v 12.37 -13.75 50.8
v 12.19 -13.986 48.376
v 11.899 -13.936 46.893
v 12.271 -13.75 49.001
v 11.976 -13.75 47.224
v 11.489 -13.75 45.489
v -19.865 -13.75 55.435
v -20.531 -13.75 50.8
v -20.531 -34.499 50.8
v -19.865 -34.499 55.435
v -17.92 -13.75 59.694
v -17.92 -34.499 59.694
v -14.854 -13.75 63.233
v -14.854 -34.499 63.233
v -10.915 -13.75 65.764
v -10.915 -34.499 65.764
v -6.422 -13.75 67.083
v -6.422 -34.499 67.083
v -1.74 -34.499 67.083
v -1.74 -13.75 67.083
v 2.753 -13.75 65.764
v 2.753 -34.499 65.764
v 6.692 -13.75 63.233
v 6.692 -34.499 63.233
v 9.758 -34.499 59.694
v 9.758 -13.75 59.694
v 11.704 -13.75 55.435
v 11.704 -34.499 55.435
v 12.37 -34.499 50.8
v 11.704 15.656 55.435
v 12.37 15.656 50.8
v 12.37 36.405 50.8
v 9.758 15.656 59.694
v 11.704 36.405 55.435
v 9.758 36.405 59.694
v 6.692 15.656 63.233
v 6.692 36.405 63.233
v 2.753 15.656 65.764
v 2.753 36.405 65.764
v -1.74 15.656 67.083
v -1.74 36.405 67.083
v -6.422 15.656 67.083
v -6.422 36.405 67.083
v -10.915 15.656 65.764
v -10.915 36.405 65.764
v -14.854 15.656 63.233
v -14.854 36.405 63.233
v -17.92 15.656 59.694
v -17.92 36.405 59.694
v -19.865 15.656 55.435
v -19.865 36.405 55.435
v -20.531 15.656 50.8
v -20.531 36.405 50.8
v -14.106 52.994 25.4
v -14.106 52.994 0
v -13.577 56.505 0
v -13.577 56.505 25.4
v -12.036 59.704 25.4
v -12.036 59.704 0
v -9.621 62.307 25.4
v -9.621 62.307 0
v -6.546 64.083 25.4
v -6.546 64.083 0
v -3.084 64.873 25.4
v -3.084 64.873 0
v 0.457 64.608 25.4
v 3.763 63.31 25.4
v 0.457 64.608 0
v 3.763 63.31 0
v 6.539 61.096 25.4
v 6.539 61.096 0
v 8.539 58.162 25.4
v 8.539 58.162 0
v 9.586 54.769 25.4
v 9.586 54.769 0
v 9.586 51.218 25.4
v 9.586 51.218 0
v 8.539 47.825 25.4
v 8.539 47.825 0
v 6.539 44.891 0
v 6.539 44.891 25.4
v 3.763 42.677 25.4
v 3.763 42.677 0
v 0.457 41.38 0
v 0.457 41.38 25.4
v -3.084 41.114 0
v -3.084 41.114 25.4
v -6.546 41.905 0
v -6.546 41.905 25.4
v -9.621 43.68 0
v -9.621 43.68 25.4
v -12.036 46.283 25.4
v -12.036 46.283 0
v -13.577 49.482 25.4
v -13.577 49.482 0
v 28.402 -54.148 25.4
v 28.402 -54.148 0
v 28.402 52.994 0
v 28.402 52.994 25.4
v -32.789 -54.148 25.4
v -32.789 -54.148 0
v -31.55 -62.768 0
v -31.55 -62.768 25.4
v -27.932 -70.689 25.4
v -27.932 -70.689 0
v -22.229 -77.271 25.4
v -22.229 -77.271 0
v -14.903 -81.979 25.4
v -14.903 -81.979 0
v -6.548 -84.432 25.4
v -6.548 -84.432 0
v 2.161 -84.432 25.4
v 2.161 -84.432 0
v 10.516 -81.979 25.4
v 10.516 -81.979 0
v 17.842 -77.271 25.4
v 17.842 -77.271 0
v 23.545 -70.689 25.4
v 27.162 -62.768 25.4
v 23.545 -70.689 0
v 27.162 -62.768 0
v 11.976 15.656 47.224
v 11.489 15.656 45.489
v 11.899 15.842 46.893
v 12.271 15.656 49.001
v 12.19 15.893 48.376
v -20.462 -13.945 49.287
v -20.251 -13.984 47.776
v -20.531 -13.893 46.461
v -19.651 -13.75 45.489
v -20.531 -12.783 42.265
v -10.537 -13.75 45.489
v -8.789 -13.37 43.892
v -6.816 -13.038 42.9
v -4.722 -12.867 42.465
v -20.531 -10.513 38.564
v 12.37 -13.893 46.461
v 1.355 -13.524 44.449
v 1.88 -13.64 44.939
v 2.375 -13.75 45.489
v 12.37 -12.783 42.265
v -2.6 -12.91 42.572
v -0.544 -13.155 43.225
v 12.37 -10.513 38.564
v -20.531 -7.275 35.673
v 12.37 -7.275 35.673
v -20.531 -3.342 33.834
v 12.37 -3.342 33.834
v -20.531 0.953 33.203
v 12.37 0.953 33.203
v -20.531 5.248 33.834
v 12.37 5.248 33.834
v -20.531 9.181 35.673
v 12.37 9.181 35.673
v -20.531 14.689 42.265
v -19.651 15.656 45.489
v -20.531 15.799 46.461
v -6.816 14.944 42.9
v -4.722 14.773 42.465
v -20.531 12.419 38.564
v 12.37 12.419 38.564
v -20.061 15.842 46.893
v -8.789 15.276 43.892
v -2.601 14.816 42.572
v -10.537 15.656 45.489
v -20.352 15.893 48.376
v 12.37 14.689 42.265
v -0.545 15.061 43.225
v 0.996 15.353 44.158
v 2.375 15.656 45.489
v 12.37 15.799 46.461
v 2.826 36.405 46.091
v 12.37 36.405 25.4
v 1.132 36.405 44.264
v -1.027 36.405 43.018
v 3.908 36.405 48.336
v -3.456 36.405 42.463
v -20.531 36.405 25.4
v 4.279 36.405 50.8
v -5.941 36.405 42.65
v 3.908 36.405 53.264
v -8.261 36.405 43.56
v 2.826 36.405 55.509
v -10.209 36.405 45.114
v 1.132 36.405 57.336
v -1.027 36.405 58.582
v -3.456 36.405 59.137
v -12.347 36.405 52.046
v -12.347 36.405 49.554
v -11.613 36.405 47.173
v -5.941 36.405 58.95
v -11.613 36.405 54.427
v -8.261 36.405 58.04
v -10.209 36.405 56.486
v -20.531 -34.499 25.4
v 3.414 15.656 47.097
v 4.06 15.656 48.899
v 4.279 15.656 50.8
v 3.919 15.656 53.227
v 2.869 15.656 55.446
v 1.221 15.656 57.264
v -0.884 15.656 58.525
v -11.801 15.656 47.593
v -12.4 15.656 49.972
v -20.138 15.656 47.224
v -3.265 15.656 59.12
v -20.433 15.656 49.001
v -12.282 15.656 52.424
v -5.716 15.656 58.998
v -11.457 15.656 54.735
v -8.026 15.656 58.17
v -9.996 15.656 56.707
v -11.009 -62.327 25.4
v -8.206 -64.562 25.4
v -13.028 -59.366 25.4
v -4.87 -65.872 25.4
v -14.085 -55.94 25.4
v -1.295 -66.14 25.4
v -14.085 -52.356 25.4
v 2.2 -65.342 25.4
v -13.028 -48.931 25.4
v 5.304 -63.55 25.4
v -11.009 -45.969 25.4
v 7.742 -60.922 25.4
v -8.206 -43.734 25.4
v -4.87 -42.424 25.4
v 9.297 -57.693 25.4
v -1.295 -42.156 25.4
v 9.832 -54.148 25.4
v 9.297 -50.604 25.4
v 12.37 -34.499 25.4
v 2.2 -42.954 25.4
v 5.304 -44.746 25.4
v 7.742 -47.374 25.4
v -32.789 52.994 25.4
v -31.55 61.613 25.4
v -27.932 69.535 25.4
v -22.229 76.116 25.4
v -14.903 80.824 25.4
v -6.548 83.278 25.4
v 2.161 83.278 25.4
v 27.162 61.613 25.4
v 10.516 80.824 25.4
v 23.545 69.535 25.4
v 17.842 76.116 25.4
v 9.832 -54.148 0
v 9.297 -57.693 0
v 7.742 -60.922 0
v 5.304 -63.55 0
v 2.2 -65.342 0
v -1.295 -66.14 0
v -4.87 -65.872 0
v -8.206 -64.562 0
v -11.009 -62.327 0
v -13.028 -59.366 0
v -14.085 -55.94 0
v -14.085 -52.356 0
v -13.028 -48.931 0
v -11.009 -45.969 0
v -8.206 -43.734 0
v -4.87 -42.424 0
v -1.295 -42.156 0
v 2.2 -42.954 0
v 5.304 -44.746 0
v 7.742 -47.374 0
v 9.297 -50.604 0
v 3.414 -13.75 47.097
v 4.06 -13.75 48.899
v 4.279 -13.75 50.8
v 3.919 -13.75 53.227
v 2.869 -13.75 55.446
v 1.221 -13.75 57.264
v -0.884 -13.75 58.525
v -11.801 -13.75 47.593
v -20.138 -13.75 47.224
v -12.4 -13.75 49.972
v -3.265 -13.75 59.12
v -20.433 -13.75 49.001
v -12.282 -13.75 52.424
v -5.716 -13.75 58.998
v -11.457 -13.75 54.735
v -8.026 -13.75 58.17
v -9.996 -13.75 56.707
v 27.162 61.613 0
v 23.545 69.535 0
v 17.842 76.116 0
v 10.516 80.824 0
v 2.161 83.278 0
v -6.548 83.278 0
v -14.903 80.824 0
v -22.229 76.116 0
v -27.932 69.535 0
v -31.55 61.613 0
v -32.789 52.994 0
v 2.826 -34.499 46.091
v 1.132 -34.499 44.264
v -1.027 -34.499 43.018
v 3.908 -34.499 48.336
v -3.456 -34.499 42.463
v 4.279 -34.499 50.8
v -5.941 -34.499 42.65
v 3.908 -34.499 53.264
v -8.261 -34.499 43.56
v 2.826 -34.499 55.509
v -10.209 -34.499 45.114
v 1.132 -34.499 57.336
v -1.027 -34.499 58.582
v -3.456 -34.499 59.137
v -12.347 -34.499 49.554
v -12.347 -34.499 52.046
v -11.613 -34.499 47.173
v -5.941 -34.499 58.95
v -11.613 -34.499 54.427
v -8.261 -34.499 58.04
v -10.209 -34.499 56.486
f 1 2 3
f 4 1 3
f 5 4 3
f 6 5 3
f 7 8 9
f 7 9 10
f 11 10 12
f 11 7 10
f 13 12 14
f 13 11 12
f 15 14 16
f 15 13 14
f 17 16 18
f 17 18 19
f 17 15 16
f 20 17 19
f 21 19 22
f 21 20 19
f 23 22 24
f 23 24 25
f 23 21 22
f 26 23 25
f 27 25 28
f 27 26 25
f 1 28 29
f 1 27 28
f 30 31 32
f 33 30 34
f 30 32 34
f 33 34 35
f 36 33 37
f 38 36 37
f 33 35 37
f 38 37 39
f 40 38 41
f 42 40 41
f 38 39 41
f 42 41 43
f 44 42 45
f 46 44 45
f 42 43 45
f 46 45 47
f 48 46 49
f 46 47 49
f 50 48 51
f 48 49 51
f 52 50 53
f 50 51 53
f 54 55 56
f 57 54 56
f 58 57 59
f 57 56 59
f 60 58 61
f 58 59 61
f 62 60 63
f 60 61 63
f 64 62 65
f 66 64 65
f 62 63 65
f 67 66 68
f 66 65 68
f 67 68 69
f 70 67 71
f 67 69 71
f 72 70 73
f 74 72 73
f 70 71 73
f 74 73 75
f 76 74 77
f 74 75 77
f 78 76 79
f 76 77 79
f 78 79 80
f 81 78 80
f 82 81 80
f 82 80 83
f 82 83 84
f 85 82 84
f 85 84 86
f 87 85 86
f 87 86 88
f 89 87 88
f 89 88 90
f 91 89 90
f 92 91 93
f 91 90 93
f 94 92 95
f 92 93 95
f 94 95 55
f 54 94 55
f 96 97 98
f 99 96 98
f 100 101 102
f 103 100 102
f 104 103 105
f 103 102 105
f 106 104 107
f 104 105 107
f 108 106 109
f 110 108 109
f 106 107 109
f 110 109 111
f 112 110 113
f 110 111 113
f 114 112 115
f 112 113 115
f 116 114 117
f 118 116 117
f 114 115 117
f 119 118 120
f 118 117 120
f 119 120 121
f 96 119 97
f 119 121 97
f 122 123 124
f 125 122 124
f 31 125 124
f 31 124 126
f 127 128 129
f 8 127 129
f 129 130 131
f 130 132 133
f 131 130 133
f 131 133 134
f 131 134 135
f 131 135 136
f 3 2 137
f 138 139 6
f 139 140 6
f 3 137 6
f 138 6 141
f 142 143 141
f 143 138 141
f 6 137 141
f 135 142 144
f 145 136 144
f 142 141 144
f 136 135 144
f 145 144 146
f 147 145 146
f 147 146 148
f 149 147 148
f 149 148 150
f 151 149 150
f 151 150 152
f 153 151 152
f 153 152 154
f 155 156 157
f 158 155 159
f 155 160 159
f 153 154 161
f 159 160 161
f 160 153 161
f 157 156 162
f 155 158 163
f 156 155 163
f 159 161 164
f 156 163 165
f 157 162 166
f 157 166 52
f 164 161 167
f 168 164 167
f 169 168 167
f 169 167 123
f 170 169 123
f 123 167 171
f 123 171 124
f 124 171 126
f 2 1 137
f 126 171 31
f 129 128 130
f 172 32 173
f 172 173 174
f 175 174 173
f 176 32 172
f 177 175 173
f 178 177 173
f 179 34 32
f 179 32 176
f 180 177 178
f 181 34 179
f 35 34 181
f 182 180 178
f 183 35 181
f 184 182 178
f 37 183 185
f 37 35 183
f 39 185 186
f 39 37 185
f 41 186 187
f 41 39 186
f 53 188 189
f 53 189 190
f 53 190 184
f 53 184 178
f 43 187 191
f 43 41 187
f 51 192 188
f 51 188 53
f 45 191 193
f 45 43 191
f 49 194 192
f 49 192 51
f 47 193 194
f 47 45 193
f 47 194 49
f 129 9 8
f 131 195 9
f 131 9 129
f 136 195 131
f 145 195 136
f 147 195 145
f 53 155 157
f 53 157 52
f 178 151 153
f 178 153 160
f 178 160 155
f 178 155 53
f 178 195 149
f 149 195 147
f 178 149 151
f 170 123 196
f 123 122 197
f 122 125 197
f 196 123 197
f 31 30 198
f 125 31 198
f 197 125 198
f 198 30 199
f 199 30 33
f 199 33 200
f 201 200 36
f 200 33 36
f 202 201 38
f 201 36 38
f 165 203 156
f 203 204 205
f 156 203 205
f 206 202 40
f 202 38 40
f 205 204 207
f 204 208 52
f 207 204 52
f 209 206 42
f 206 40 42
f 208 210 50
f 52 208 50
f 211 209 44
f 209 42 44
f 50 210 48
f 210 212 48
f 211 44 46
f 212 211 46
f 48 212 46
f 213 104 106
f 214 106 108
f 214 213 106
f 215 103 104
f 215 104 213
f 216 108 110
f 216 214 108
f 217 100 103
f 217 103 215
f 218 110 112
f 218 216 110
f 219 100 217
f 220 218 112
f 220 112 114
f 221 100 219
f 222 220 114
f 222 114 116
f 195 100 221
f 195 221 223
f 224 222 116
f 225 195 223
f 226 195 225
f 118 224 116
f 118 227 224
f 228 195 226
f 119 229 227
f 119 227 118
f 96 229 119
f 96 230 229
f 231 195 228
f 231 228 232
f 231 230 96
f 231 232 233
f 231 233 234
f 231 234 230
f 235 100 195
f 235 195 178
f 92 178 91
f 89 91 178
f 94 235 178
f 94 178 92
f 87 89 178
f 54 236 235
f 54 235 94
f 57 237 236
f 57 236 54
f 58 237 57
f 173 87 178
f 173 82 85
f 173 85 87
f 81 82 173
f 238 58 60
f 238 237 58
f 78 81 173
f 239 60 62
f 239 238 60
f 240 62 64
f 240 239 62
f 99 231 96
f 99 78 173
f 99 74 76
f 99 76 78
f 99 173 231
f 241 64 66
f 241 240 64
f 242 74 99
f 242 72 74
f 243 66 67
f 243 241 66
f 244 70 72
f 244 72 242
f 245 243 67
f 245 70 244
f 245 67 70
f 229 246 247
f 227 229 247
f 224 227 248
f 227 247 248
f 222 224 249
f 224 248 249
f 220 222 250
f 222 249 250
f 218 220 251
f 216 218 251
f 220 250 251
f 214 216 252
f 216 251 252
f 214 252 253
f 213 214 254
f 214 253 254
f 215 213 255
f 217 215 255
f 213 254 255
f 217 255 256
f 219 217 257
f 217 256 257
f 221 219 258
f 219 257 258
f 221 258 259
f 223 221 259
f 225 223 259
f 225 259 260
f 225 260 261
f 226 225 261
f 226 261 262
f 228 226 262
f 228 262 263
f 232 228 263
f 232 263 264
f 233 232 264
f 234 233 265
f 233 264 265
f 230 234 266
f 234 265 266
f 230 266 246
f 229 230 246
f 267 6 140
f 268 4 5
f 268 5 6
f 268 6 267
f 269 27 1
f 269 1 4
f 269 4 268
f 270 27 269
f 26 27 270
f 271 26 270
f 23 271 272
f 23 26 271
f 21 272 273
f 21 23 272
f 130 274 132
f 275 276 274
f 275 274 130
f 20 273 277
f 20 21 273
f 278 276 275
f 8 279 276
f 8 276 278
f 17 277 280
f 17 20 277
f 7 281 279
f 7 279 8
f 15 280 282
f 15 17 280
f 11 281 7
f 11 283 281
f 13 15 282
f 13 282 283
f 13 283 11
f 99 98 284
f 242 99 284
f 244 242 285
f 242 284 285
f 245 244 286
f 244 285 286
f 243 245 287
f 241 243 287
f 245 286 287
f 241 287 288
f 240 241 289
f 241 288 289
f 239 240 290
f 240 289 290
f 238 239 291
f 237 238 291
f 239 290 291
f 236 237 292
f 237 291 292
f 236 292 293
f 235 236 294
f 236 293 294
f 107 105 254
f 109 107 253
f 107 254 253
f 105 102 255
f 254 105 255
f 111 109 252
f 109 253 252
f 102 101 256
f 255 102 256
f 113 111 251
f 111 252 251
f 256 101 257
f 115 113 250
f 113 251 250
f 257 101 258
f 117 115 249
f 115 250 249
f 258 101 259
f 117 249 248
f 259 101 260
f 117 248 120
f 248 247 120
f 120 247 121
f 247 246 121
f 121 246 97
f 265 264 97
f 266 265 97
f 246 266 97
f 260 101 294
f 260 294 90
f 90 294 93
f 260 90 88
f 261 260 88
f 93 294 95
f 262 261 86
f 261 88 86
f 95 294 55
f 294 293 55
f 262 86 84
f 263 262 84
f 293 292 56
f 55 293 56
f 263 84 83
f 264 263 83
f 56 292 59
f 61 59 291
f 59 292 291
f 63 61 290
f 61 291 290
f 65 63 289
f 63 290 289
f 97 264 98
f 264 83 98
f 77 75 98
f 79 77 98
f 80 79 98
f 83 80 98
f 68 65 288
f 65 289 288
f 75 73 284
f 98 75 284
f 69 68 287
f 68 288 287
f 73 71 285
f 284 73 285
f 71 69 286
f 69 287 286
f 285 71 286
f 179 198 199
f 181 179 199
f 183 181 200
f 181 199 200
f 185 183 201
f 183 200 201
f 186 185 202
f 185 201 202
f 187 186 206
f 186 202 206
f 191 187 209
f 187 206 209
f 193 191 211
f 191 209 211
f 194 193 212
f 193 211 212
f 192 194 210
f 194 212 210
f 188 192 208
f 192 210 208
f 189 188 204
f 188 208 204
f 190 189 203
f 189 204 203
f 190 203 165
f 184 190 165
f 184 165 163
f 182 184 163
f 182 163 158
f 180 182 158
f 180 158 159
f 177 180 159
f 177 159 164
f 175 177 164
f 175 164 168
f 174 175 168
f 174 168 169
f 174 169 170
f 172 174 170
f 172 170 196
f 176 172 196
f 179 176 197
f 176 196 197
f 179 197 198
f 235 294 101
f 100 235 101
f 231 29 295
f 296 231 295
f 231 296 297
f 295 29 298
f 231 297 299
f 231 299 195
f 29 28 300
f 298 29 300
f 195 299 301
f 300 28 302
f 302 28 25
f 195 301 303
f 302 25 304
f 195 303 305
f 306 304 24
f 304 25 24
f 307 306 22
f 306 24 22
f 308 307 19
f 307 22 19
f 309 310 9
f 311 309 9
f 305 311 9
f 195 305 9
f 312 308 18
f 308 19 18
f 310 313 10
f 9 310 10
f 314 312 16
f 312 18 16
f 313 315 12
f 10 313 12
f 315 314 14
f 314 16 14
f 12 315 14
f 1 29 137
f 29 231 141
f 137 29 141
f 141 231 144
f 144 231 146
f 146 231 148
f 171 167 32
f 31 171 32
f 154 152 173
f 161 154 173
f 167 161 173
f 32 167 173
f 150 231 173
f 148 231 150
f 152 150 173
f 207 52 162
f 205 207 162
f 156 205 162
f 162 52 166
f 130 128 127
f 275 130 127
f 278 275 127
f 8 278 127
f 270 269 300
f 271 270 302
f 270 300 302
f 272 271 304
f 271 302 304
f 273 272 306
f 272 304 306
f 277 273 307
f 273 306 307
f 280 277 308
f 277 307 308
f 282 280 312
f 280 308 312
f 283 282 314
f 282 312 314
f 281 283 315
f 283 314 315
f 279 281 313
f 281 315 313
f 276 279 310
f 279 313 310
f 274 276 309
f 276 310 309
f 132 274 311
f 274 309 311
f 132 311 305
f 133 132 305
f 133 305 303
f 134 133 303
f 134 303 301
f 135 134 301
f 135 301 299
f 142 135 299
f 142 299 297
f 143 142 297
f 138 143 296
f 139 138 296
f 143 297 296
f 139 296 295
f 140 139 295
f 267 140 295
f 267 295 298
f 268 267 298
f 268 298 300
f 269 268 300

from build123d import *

# Parameters (mm, degrees)
F0_W      = 32.9013951123
F0_H      = 70.9037855268
F1_DEPTH  = 25.4
F2_DEPTH  = 50.8
F3_R      = 14.9412695824
F4_DEPTH  = 76.2
F5_W      = 16.4506975561
F5_H      = 20.7484884761
F7_W      = 16.4506975561
F7_H      = 20.7484884761
F9_R      = 8.3599226064
F10_DEPTH = 508


with BuildPart() as f1:
    # F0 (on Top) → F1 (new body)
    with BuildSketch(Plane.XY):
        with BuildLine():
            Line((28.4018162638, 52.9936365783), (9.7189312353, 52.9936365783))
            ThreePointArc((9.7189312353, 52.9936365783), (-2.1936381236, 41.0810672195), (-14.1062074824, 52.9936365783))
            Line((-14.1062074824, 52.9936365783), (-32.7890925109, 52.9936365783))
            Line((-32.7890925109, 52.9936365783), (-32.7890925109, -54.1481785476))
            Line((-32.7890925109, -54.1481785476), (-14.2189597558, -54.1481785476))
            ThreePointArc((-14.2189597558, -54.1481785476), (-2.1936381236, -42.1228569154), (9.8316835087, -54.1481785476))
            Line((9.8316835087, -54.1481785476), (28.4018162638, -54.1481785476))
            Line((28.4018162638, -54.1481785476), (28.4018162638, 52.9936365783))
        make_face()
        with Locations((-4.080792889, 0.9530261159)):
            Rectangle(F0_W, F0_H, mode=Mode.SUBTRACT)
        with BuildLine():
            ThreePointArc((-14.1062074824, 52.9936365783), (-2.1936381236, 64.9062059372), (9.7189312353, 52.9936365783))
            Line((9.7189312353, 52.9936365783), (28.4018162638, 52.9936365783))
            ThreePointArc((28.4018162638, 52.9936365783), (-2.1936381236, 83.5890909657), (-32.7890925109, 52.9936365783))
            Line((-32.7890925109, 52.9936365783), (-14.1062074824, 52.9936365783))
        make_face()
        with BuildLine():
            ThreePointArc((-32.7890925109, -54.1481785476), (-2.1936381236, -84.743632935), (28.4018162638, -54.1481785476))
            Line((28.4018162638, -54.1481785476), (9.8316835087, -54.1481785476))
            ThreePointArc((9.8316835087, -54.1481785476), (-2.1936381236, -66.1735001799), (-14.2189597558, -54.1481785476))
            Line((-14.2189597558, -54.1481785476), (-32.7890925109, -54.1481785476))
        make_face()
    extrude(amount=F1_DEPTH)

    # F0 (on Top) → F2 (join)
    with BuildSketch(Plane.XY):
        with Locations((-4.080792889, 0.9530261159)):
            Rectangle(F0_W, F0_H)
    extrude(amount=F2_DEPTH)

    # F3 (on face) → F4 (cut)
    with BuildSketch(Plane.YZ.offset(12.3699046671)):
        with Locations((0.9530261159, 48.1445454061)):
            Circle(F3_R)
    extrude(amount=-F4_DEPTH, mode=Mode.SUBTRACT)

    # F5 (on face) → F6 (revolve)
    with BuildSketch(Plane.XY.offset(50.8)):
        with Locations((4.1445558891, 26.0306746412)):
            Rectangle(F5_W, F5_H)
    revolve(axis=Axis((-4.080792889, 26.0306746412, 50.8), (0, -1, 0)))

    # F7 (on face) → F8 (revolve)
    with BuildSketch(Plane.XY.offset(50.8)):
        with Locations((-12.3061416671, -24.1246224094)):
            Rectangle(F7_W, F7_H)
    revolve(axis=Axis((-4.080792889, -24.1246224094, 50.8), (0, 1, 0)))

    # F9 (on face) → F10 (cut)
    with BuildSketch(Plane.XZ.offset(34.4988666475)):
        with Locations((-4.080792889, 50.8)):
            Circle(F9_R)
    extrude(amount=-F10_DEPTH, mode=Mode.SUBTRACT)


solid = f1.part
